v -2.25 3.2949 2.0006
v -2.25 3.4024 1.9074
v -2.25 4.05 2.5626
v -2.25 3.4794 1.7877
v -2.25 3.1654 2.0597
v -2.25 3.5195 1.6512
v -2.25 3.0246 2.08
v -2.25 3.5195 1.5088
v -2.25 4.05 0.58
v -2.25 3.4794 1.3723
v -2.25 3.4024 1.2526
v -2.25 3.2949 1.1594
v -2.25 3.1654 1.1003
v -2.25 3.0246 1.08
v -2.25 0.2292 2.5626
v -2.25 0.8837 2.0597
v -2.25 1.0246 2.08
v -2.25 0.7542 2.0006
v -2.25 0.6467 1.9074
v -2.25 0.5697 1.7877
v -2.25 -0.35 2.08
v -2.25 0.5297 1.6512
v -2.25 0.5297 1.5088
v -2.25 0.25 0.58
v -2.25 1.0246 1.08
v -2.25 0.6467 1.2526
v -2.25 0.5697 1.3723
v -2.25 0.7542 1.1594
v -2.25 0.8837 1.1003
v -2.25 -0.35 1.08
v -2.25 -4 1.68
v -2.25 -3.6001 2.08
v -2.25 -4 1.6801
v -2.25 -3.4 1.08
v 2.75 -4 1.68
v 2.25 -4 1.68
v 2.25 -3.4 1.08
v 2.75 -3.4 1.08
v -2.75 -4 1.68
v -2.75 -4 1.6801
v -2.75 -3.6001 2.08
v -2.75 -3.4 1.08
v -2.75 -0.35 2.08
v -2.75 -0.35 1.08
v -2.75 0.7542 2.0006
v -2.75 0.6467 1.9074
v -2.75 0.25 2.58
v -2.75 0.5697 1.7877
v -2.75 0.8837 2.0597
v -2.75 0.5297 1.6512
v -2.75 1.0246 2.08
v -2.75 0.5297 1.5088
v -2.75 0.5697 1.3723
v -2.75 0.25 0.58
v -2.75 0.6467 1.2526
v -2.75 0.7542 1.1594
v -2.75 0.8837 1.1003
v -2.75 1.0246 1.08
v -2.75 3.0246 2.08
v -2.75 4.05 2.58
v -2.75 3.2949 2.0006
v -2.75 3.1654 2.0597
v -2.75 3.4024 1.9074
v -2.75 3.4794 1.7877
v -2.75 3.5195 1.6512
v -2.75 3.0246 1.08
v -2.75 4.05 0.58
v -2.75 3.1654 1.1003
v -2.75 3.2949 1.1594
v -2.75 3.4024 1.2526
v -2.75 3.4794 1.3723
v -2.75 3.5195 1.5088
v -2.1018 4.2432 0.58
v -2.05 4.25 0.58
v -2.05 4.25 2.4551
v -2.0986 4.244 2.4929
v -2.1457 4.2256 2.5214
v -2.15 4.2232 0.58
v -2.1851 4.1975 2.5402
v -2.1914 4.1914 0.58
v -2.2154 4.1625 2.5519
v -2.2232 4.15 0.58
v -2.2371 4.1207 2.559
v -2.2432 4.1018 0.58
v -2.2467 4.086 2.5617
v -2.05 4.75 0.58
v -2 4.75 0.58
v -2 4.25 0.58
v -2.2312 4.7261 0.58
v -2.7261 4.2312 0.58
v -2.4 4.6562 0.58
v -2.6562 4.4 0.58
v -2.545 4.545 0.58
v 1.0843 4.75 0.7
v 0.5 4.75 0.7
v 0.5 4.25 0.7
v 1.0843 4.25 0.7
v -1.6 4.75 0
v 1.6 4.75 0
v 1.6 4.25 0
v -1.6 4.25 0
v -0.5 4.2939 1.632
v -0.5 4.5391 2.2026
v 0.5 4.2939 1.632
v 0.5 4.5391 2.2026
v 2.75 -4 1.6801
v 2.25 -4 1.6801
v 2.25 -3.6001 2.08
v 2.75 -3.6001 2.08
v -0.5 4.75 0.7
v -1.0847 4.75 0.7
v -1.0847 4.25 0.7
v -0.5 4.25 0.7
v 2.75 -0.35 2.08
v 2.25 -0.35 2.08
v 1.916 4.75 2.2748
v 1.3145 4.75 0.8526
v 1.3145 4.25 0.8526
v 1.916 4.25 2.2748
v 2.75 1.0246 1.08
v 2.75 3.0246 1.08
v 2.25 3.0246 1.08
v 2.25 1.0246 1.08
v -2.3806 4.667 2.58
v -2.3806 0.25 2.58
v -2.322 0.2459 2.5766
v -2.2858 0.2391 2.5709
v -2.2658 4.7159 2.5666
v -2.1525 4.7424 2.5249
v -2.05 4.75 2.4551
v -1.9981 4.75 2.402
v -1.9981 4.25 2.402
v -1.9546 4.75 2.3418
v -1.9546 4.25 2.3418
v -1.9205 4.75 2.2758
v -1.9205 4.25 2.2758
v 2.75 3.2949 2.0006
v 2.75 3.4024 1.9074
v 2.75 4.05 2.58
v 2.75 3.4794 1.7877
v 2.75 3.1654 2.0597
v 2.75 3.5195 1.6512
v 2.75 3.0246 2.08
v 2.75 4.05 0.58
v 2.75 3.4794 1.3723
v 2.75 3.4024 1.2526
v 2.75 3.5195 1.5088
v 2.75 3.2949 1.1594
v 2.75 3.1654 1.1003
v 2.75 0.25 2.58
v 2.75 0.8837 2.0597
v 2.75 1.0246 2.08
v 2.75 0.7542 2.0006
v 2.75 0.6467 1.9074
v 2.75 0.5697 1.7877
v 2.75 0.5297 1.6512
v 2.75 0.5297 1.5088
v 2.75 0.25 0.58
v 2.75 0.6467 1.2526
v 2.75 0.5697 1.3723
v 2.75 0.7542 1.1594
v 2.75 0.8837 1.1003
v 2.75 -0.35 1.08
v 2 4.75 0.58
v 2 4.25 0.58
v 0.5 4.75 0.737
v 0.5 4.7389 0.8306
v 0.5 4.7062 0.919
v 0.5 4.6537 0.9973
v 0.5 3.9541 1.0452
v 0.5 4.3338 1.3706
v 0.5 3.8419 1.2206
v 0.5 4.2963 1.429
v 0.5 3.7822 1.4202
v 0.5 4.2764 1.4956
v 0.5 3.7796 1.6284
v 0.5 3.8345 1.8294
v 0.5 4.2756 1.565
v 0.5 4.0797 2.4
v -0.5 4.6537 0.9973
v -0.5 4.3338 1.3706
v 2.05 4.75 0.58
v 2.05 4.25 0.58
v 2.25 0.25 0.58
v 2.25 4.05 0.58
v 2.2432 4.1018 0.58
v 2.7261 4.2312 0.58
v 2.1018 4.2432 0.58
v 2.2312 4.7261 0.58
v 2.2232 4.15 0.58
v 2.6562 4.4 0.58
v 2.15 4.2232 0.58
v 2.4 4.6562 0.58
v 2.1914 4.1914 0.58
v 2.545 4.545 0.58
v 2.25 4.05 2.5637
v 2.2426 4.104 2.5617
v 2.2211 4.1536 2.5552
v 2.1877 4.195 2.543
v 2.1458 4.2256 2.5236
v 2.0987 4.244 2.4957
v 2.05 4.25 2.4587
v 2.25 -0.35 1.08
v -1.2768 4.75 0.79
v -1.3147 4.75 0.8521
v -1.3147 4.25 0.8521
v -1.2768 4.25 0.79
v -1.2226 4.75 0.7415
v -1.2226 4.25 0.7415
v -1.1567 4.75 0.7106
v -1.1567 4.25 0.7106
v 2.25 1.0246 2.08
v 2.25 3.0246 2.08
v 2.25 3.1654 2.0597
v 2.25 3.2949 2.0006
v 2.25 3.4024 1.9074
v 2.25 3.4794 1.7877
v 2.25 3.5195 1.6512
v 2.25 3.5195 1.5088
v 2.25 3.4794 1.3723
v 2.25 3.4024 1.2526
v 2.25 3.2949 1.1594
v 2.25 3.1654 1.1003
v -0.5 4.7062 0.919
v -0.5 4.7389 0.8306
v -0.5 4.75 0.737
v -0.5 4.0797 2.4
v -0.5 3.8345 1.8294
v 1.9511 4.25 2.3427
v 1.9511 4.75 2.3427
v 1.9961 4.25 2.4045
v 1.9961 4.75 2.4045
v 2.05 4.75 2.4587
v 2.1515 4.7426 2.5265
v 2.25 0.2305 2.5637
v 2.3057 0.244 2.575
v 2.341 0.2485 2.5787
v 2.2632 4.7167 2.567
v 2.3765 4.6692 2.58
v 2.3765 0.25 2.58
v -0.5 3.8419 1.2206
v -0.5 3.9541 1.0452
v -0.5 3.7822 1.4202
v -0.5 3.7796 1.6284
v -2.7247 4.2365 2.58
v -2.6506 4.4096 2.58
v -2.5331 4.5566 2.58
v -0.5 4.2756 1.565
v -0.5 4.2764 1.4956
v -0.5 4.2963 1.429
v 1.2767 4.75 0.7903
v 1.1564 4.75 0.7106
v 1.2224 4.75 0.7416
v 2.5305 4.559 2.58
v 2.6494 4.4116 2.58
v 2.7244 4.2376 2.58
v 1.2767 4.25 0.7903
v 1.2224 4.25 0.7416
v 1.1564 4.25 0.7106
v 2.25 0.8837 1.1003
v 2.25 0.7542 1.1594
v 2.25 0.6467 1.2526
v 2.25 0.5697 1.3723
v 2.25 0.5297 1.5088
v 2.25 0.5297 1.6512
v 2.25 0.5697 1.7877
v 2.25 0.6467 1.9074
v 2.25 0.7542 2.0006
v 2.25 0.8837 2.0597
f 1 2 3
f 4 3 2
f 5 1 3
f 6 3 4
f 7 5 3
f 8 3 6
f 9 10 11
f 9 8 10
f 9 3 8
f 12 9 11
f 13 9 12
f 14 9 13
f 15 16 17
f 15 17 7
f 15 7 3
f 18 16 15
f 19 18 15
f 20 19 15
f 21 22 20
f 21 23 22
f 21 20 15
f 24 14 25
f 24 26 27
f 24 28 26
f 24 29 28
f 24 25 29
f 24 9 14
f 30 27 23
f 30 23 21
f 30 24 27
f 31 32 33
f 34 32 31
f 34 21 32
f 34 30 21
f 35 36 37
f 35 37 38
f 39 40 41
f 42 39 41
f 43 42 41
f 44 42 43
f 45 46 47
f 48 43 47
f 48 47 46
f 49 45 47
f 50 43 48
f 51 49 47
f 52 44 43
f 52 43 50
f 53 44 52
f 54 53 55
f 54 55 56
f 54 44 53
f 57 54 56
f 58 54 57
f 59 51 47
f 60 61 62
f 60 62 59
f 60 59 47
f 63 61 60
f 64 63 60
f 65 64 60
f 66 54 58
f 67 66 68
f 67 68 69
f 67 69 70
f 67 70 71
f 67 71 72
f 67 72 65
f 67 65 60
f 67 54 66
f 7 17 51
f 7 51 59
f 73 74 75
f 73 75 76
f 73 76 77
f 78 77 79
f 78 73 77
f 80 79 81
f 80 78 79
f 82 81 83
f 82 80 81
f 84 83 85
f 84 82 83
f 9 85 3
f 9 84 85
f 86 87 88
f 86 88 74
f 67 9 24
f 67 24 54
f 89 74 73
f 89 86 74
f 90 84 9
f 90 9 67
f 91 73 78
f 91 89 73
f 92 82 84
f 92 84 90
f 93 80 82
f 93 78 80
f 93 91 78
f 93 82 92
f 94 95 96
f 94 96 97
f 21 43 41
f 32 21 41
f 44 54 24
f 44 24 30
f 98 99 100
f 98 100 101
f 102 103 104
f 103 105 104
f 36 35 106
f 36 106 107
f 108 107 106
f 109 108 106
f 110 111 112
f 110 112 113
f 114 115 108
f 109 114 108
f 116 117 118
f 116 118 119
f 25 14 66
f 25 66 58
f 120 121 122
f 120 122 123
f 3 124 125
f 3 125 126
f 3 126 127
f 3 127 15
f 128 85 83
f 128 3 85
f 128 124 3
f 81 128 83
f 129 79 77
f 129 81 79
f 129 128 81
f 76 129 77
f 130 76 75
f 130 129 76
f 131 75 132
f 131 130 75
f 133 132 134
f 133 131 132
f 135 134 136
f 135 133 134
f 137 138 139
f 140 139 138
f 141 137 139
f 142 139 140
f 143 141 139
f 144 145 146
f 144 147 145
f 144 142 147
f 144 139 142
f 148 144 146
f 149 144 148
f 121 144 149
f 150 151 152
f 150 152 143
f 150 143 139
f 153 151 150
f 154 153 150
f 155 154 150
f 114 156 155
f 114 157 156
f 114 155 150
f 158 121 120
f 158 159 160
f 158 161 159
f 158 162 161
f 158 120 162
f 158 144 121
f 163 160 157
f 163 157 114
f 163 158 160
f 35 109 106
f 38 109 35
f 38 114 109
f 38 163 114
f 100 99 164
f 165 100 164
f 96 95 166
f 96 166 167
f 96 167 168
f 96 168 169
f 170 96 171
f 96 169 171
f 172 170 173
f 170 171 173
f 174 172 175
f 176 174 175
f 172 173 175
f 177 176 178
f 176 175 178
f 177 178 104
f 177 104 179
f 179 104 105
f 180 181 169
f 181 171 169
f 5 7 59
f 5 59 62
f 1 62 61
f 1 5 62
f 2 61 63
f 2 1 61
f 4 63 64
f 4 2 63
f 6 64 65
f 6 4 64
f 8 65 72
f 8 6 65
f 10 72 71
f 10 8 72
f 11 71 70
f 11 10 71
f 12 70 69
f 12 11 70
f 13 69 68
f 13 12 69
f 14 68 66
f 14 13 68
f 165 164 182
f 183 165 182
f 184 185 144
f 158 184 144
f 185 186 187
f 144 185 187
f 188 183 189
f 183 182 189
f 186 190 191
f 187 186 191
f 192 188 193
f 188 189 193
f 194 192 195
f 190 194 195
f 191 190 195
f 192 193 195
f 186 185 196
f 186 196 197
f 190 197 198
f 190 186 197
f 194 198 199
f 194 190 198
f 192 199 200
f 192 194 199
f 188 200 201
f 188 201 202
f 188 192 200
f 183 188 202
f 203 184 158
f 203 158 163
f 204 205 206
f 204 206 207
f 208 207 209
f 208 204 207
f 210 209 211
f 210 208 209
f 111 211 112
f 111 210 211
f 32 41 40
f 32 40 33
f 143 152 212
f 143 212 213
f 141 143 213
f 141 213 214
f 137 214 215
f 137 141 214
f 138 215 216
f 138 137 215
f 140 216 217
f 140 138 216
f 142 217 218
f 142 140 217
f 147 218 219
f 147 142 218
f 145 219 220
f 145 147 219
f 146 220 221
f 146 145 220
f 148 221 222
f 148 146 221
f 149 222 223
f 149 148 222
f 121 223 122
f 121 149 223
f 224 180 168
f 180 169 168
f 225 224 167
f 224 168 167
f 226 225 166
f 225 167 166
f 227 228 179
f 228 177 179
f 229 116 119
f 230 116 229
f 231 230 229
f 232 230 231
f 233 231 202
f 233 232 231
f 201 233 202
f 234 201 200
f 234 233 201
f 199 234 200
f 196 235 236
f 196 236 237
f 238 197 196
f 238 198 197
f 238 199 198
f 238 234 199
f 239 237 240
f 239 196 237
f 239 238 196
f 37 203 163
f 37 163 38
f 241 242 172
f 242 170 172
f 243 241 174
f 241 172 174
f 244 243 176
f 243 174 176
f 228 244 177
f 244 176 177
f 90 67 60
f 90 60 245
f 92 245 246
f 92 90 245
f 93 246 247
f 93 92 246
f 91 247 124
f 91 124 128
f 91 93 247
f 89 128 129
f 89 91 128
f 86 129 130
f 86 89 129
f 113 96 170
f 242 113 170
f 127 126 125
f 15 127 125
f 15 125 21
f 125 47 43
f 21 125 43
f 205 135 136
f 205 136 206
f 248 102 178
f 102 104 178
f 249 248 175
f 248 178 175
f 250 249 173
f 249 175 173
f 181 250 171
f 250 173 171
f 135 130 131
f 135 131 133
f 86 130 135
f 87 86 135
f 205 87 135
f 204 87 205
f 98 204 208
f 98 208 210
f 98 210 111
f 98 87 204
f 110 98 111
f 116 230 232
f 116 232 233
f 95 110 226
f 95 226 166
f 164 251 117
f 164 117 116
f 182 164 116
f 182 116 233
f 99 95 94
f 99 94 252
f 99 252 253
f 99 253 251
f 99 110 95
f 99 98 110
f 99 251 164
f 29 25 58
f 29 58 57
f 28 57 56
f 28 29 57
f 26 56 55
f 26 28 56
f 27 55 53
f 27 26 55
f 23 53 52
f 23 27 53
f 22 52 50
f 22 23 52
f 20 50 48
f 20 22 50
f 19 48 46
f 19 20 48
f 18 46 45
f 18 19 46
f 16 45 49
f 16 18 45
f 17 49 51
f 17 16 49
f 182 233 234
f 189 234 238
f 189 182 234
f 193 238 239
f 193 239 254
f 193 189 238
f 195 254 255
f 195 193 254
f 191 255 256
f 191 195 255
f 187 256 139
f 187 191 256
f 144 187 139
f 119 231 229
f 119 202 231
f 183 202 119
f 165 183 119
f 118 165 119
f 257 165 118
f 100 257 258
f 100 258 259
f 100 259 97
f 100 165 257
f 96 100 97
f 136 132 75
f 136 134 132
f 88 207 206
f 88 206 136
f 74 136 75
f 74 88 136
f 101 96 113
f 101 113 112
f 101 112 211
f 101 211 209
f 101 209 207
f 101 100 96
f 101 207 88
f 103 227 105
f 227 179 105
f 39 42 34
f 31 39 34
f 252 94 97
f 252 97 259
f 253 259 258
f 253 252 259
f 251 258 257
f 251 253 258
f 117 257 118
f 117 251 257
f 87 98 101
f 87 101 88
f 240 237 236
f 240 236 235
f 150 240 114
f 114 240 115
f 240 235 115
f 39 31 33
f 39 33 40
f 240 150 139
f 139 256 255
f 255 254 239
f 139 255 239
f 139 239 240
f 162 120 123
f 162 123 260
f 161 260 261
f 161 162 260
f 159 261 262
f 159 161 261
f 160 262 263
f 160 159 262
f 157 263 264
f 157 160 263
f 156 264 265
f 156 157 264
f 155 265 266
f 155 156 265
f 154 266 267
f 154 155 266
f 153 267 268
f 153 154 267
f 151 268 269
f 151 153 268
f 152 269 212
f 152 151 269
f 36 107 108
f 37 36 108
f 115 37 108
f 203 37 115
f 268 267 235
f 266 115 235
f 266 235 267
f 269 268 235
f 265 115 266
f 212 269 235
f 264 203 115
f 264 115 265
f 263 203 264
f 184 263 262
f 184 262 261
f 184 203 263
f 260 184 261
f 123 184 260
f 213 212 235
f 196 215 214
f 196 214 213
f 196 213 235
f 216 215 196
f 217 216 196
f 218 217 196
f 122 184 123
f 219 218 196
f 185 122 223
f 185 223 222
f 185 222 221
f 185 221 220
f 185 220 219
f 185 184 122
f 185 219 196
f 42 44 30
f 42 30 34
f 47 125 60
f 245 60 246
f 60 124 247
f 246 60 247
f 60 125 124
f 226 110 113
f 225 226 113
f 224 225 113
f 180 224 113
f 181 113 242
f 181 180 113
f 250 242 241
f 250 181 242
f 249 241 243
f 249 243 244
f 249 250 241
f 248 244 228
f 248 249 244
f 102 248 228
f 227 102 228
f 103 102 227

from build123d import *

# Parameters (mm, degrees)
BOSS_EXTRUDE1_DEPTH = 2.58
CUT_EXTRUDE1_DEPTH  = 10.5
CUT_EXTRUDE2_DEPTH  = 5.25
BOSS_EXTRUDE2_DEPTH = 0.5
CHAMFER1_SIZE       = 0.6
CHAMFER2_SIZE       = 0.4


with BuildPart() as part:
    # Sketch1 → Boss-Extrude1 (new body)
    with BuildSketch(Plane.XY):
        with BuildLine():
            Line((-2.75, -4), (-2.75, 4.05))
            ThreePointArc((-2.75, 4.05), (-2.544974747, 4.544974747), (-2.05, 4.75))
            Line((-2.05, 4.75), (2.05, 4.75))
            ThreePointArc((2.05, 4.75), (2.544974747, 4.544974747), (2.75, 4.05))
            Line((2.75, 4.05), (2.75, -4))
            Line((2.75, -4), (2.25, -4))
            Line((2.25, -4), (2.25, 4.05))
            ThreePointArc((2.25, 4.05), (2.191421356, 4.191421356), (2.05, 4.25))
            Line((2.05, 4.25), (-2.05, 4.25))
            ThreePointArc((-2.05, 4.25), (-2.191421356, 4.191421356), (-2.25, 4.05))
            Line((-2.25, 4.05), (-2.25, -4))
            Line((-2.25, -4), (-2.75, -4))
        make_face()
    extrude(amount=BOSS_EXTRUDE1_DEPTH)

    # Sketch2 → Cut-Extrude1 (cut)
    with BuildSketch(Plane(origin=(0, 4.75, 0), x_dir=(1, 0, 0), z_dir=(0, 1, 0))):
        Polygon((-2, -0.58), (-4.099439411, -0.58), (-4.099439411, 0.833357165), (-2, 0.833357165), (-1.6, 0), align=None)
        Polygon((2, -0.58), (3.357409655, -0.58), (3.357409655, 0.833357165), (2, 0.833357165), (1.6, 0), align=None)
        with BuildLine():
            Line((-2.75, -2.58), (-2.38062097, -2.58))
            ThreePointArc((-2.38062097, -2.58), (-2.104839164, -2.497066416), (-1.920543652, -2.275777582))
            Line((-1.920543652, -2.275777582), (-1.314728174, -0.852111209))
            ThreePointArc((-1.314728174, -0.852111209), (-1.222580418, -0.741466792), (-1.084689515, -0.7))
            Line((-1.084689515, -0.7), (1.084290526, -0.7))
            ThreePointArc((1.084290526, -0.7), (1.222412736, -0.741619926), (1.314545856, -0.852621958))
            Line((1.314545856, -0.852621958), (1.915985292, -2.274756083))
            ThreePointArc((1.915985292, -2.274756083), (2.100251533, -2.496760148), (2.376495952, -2.58))
            Line((2.376495952, -2.58), (2.75, -2.58))
            Line((2.75, -2.58), (2.75, -3.056093585))
            Line((2.75, -3.056093585), (-2.75, -3.056093585))
            Line((-2.75, -3.056093585), (-2.75, -2.58))
        make_face()
    extrude(amount=-CUT_EXTRUDE1_DEPTH, mode=Mode.SUBTRACT)

    # Sketch3 → Cut-Extrude2 (cut, symmetric)
    with BuildSketch(Plane(origin=(0, 0, 0), x_dir=(0, 0, -1), z_dir=(1, 0, 0))):
        Polygon((-0.58, 0.25), (-1.08, -0.35), (-1.08, -4.396314828), (-0.130305992, -4.396314828), (-0.130305992, 0.25), align=None)
        Polygon((-2.58, 0.25), (-2.08, -0.35), (-2.08, -4.896314828), (-3.070294312, -4.896314828), (-3.070294312, 0.25), align=None)
        with BuildLine():
            Line((-1.08, 3.024565065), (-1.08, 1.024565065))
            ThreePointArc((-1.08, 1.024565065), (-1.58, 0.524565065), (-2.08, 1.024565065))
            Line((-2.08, 1.024565065), (-2.08, 3.024565065))
            ThreePointArc((-2.08, 3.024565065), (-1.58, 3.524565065), (-1.08, 3.024565065))
        make_face()
    extrude(amount=CUT_EXTRUDE2_DEPTH, both=True, mode=Mode.SUBTRACT)

    # Sketch4 → Boss-Extrude2 (add, symmetric)
    with BuildSketch(Plane(origin=(0, 0, 0), x_dir=(0, 0, -1), z_dir=(1, 0, 0))):
        with BuildLine():
            Line((-0.7, 4.25), (-1.045169213, 3.954140675))
            ThreePointArc((-1.045169213, 3.954140675), (-1.420160684, 3.782160221), (-1.829373497, 3.834512432))
            Line((-1.829373497, 3.834512432), (-2.4, 4.079724782))
            Line((-2.4, 4.079724782), (-2.202592831, 4.539105245))
            Line((-2.202592831, 4.539105245), (-1.631966328, 4.293892895))
            ThreePointArc((-1.631966328, 4.293892895), (-1.495562057, 4.276442158), (-1.3705649, 4.333768976))
            Line((-1.3705649, 4.333768976), (-0.997308957, 4.653702641))
            ThreePointArc((-0.997308957, 4.653702641), (-0.875770907, 4.725154006), (-0.736992408, 4.75))
            Line((-0.736992408, 4.75), (-0.7, 4.75))
            Line((-0.7, 4.75), (-0.7, 4.25))
        make_face()
    extrude(amount=BOSS_EXTRUDE2_DEPTH, both=True)

    # Chamfer1
    chamfer1_edges = [part.edges().sort_by_distance(p)[0] for p in [
        (2.5, -4, 1.08),
        (-2.5, -4, 1.08),
    ]]
    chamfer(chamfer1_edges, length=CHAMFER1_SIZE)

    # Chamfer2
    chamfer2_edges = [part.edges().sort_by_distance(p)[0] for p in [
        (-2.5, -4, 2.08),
        (2.5, -4, 2.08),
    ]]
    chamfer(chamfer2_edges, length=CHAMFER2_SIZE - 0.0001)  # a hair under: the kernel refuses the full size


solid = part.part
